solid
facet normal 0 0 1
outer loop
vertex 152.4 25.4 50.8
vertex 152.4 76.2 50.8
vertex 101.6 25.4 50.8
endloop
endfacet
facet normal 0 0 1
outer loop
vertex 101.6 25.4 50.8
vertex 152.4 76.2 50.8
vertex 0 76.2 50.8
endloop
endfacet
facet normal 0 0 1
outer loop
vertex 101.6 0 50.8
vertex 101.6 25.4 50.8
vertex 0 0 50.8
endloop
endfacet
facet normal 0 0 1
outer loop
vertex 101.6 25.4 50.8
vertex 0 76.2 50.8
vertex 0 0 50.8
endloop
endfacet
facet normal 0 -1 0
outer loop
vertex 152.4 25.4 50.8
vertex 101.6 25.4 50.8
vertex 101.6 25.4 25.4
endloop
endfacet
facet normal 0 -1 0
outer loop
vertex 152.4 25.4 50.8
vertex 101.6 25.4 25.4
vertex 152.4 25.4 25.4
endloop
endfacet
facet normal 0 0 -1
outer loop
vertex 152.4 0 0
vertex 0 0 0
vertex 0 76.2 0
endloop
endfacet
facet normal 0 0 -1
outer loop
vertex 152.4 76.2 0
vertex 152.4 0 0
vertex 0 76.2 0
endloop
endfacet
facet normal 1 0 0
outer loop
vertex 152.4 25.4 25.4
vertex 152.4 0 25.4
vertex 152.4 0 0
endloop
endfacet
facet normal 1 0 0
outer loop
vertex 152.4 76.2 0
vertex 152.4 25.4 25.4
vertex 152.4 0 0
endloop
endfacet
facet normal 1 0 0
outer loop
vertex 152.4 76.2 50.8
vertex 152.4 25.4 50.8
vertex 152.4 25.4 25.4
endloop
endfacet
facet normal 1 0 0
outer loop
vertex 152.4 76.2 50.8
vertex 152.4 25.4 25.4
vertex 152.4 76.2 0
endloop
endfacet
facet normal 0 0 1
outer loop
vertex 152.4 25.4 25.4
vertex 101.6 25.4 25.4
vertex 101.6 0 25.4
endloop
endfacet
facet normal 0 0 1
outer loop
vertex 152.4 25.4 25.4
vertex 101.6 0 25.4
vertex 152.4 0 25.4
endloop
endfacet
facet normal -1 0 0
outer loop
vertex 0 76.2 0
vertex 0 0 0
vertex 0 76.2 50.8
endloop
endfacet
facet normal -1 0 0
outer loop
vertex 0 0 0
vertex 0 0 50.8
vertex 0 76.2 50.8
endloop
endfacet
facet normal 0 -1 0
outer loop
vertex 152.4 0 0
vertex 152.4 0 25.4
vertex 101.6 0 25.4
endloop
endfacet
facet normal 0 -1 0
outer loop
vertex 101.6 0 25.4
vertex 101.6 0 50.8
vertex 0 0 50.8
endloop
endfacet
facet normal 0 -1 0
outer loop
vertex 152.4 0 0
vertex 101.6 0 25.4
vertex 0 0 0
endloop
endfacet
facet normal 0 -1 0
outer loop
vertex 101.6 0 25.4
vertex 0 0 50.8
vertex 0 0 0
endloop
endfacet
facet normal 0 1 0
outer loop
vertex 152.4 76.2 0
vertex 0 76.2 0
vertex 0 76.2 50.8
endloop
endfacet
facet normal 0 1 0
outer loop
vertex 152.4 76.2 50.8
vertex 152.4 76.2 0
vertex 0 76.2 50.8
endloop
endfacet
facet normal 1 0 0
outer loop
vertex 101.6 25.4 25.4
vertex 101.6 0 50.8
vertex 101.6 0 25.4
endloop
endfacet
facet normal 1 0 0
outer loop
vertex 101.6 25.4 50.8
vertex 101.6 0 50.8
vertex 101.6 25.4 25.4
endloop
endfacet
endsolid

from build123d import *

# Parameters (mm, degrees)
F0_W     = 25.4
F0_H     = 25.4
F1_DEPTH = 152.4
F3_W     = 50.8
F3_H     = 25.4
F4_DEPTH = 25.4


with BuildPart() as f1:
    # F0 (on Right) → F1 (new body)
    with BuildSketch(Plane.YZ):
        Polygon((0, 25.4), (0, 0), (76.2, 0), (76.2, 50.8), (25.4, 50.8), (25.4, 25.4), align=None)
        with Locations((12.7, 38.1)):
            Rectangle(F0_W, F0_H)
    extrude(amount=F1_DEPTH)

    # F3 (on face) → F4 (cut)
    with BuildSketch(Plane.XY.offset(50.8)):
        with Locations((127, 12.7)):
            Rectangle(F3_W, F3_H)
    extrude(amount=-F4_DEPTH, mode=Mode.SUBTRACT)


solid = f1.part
